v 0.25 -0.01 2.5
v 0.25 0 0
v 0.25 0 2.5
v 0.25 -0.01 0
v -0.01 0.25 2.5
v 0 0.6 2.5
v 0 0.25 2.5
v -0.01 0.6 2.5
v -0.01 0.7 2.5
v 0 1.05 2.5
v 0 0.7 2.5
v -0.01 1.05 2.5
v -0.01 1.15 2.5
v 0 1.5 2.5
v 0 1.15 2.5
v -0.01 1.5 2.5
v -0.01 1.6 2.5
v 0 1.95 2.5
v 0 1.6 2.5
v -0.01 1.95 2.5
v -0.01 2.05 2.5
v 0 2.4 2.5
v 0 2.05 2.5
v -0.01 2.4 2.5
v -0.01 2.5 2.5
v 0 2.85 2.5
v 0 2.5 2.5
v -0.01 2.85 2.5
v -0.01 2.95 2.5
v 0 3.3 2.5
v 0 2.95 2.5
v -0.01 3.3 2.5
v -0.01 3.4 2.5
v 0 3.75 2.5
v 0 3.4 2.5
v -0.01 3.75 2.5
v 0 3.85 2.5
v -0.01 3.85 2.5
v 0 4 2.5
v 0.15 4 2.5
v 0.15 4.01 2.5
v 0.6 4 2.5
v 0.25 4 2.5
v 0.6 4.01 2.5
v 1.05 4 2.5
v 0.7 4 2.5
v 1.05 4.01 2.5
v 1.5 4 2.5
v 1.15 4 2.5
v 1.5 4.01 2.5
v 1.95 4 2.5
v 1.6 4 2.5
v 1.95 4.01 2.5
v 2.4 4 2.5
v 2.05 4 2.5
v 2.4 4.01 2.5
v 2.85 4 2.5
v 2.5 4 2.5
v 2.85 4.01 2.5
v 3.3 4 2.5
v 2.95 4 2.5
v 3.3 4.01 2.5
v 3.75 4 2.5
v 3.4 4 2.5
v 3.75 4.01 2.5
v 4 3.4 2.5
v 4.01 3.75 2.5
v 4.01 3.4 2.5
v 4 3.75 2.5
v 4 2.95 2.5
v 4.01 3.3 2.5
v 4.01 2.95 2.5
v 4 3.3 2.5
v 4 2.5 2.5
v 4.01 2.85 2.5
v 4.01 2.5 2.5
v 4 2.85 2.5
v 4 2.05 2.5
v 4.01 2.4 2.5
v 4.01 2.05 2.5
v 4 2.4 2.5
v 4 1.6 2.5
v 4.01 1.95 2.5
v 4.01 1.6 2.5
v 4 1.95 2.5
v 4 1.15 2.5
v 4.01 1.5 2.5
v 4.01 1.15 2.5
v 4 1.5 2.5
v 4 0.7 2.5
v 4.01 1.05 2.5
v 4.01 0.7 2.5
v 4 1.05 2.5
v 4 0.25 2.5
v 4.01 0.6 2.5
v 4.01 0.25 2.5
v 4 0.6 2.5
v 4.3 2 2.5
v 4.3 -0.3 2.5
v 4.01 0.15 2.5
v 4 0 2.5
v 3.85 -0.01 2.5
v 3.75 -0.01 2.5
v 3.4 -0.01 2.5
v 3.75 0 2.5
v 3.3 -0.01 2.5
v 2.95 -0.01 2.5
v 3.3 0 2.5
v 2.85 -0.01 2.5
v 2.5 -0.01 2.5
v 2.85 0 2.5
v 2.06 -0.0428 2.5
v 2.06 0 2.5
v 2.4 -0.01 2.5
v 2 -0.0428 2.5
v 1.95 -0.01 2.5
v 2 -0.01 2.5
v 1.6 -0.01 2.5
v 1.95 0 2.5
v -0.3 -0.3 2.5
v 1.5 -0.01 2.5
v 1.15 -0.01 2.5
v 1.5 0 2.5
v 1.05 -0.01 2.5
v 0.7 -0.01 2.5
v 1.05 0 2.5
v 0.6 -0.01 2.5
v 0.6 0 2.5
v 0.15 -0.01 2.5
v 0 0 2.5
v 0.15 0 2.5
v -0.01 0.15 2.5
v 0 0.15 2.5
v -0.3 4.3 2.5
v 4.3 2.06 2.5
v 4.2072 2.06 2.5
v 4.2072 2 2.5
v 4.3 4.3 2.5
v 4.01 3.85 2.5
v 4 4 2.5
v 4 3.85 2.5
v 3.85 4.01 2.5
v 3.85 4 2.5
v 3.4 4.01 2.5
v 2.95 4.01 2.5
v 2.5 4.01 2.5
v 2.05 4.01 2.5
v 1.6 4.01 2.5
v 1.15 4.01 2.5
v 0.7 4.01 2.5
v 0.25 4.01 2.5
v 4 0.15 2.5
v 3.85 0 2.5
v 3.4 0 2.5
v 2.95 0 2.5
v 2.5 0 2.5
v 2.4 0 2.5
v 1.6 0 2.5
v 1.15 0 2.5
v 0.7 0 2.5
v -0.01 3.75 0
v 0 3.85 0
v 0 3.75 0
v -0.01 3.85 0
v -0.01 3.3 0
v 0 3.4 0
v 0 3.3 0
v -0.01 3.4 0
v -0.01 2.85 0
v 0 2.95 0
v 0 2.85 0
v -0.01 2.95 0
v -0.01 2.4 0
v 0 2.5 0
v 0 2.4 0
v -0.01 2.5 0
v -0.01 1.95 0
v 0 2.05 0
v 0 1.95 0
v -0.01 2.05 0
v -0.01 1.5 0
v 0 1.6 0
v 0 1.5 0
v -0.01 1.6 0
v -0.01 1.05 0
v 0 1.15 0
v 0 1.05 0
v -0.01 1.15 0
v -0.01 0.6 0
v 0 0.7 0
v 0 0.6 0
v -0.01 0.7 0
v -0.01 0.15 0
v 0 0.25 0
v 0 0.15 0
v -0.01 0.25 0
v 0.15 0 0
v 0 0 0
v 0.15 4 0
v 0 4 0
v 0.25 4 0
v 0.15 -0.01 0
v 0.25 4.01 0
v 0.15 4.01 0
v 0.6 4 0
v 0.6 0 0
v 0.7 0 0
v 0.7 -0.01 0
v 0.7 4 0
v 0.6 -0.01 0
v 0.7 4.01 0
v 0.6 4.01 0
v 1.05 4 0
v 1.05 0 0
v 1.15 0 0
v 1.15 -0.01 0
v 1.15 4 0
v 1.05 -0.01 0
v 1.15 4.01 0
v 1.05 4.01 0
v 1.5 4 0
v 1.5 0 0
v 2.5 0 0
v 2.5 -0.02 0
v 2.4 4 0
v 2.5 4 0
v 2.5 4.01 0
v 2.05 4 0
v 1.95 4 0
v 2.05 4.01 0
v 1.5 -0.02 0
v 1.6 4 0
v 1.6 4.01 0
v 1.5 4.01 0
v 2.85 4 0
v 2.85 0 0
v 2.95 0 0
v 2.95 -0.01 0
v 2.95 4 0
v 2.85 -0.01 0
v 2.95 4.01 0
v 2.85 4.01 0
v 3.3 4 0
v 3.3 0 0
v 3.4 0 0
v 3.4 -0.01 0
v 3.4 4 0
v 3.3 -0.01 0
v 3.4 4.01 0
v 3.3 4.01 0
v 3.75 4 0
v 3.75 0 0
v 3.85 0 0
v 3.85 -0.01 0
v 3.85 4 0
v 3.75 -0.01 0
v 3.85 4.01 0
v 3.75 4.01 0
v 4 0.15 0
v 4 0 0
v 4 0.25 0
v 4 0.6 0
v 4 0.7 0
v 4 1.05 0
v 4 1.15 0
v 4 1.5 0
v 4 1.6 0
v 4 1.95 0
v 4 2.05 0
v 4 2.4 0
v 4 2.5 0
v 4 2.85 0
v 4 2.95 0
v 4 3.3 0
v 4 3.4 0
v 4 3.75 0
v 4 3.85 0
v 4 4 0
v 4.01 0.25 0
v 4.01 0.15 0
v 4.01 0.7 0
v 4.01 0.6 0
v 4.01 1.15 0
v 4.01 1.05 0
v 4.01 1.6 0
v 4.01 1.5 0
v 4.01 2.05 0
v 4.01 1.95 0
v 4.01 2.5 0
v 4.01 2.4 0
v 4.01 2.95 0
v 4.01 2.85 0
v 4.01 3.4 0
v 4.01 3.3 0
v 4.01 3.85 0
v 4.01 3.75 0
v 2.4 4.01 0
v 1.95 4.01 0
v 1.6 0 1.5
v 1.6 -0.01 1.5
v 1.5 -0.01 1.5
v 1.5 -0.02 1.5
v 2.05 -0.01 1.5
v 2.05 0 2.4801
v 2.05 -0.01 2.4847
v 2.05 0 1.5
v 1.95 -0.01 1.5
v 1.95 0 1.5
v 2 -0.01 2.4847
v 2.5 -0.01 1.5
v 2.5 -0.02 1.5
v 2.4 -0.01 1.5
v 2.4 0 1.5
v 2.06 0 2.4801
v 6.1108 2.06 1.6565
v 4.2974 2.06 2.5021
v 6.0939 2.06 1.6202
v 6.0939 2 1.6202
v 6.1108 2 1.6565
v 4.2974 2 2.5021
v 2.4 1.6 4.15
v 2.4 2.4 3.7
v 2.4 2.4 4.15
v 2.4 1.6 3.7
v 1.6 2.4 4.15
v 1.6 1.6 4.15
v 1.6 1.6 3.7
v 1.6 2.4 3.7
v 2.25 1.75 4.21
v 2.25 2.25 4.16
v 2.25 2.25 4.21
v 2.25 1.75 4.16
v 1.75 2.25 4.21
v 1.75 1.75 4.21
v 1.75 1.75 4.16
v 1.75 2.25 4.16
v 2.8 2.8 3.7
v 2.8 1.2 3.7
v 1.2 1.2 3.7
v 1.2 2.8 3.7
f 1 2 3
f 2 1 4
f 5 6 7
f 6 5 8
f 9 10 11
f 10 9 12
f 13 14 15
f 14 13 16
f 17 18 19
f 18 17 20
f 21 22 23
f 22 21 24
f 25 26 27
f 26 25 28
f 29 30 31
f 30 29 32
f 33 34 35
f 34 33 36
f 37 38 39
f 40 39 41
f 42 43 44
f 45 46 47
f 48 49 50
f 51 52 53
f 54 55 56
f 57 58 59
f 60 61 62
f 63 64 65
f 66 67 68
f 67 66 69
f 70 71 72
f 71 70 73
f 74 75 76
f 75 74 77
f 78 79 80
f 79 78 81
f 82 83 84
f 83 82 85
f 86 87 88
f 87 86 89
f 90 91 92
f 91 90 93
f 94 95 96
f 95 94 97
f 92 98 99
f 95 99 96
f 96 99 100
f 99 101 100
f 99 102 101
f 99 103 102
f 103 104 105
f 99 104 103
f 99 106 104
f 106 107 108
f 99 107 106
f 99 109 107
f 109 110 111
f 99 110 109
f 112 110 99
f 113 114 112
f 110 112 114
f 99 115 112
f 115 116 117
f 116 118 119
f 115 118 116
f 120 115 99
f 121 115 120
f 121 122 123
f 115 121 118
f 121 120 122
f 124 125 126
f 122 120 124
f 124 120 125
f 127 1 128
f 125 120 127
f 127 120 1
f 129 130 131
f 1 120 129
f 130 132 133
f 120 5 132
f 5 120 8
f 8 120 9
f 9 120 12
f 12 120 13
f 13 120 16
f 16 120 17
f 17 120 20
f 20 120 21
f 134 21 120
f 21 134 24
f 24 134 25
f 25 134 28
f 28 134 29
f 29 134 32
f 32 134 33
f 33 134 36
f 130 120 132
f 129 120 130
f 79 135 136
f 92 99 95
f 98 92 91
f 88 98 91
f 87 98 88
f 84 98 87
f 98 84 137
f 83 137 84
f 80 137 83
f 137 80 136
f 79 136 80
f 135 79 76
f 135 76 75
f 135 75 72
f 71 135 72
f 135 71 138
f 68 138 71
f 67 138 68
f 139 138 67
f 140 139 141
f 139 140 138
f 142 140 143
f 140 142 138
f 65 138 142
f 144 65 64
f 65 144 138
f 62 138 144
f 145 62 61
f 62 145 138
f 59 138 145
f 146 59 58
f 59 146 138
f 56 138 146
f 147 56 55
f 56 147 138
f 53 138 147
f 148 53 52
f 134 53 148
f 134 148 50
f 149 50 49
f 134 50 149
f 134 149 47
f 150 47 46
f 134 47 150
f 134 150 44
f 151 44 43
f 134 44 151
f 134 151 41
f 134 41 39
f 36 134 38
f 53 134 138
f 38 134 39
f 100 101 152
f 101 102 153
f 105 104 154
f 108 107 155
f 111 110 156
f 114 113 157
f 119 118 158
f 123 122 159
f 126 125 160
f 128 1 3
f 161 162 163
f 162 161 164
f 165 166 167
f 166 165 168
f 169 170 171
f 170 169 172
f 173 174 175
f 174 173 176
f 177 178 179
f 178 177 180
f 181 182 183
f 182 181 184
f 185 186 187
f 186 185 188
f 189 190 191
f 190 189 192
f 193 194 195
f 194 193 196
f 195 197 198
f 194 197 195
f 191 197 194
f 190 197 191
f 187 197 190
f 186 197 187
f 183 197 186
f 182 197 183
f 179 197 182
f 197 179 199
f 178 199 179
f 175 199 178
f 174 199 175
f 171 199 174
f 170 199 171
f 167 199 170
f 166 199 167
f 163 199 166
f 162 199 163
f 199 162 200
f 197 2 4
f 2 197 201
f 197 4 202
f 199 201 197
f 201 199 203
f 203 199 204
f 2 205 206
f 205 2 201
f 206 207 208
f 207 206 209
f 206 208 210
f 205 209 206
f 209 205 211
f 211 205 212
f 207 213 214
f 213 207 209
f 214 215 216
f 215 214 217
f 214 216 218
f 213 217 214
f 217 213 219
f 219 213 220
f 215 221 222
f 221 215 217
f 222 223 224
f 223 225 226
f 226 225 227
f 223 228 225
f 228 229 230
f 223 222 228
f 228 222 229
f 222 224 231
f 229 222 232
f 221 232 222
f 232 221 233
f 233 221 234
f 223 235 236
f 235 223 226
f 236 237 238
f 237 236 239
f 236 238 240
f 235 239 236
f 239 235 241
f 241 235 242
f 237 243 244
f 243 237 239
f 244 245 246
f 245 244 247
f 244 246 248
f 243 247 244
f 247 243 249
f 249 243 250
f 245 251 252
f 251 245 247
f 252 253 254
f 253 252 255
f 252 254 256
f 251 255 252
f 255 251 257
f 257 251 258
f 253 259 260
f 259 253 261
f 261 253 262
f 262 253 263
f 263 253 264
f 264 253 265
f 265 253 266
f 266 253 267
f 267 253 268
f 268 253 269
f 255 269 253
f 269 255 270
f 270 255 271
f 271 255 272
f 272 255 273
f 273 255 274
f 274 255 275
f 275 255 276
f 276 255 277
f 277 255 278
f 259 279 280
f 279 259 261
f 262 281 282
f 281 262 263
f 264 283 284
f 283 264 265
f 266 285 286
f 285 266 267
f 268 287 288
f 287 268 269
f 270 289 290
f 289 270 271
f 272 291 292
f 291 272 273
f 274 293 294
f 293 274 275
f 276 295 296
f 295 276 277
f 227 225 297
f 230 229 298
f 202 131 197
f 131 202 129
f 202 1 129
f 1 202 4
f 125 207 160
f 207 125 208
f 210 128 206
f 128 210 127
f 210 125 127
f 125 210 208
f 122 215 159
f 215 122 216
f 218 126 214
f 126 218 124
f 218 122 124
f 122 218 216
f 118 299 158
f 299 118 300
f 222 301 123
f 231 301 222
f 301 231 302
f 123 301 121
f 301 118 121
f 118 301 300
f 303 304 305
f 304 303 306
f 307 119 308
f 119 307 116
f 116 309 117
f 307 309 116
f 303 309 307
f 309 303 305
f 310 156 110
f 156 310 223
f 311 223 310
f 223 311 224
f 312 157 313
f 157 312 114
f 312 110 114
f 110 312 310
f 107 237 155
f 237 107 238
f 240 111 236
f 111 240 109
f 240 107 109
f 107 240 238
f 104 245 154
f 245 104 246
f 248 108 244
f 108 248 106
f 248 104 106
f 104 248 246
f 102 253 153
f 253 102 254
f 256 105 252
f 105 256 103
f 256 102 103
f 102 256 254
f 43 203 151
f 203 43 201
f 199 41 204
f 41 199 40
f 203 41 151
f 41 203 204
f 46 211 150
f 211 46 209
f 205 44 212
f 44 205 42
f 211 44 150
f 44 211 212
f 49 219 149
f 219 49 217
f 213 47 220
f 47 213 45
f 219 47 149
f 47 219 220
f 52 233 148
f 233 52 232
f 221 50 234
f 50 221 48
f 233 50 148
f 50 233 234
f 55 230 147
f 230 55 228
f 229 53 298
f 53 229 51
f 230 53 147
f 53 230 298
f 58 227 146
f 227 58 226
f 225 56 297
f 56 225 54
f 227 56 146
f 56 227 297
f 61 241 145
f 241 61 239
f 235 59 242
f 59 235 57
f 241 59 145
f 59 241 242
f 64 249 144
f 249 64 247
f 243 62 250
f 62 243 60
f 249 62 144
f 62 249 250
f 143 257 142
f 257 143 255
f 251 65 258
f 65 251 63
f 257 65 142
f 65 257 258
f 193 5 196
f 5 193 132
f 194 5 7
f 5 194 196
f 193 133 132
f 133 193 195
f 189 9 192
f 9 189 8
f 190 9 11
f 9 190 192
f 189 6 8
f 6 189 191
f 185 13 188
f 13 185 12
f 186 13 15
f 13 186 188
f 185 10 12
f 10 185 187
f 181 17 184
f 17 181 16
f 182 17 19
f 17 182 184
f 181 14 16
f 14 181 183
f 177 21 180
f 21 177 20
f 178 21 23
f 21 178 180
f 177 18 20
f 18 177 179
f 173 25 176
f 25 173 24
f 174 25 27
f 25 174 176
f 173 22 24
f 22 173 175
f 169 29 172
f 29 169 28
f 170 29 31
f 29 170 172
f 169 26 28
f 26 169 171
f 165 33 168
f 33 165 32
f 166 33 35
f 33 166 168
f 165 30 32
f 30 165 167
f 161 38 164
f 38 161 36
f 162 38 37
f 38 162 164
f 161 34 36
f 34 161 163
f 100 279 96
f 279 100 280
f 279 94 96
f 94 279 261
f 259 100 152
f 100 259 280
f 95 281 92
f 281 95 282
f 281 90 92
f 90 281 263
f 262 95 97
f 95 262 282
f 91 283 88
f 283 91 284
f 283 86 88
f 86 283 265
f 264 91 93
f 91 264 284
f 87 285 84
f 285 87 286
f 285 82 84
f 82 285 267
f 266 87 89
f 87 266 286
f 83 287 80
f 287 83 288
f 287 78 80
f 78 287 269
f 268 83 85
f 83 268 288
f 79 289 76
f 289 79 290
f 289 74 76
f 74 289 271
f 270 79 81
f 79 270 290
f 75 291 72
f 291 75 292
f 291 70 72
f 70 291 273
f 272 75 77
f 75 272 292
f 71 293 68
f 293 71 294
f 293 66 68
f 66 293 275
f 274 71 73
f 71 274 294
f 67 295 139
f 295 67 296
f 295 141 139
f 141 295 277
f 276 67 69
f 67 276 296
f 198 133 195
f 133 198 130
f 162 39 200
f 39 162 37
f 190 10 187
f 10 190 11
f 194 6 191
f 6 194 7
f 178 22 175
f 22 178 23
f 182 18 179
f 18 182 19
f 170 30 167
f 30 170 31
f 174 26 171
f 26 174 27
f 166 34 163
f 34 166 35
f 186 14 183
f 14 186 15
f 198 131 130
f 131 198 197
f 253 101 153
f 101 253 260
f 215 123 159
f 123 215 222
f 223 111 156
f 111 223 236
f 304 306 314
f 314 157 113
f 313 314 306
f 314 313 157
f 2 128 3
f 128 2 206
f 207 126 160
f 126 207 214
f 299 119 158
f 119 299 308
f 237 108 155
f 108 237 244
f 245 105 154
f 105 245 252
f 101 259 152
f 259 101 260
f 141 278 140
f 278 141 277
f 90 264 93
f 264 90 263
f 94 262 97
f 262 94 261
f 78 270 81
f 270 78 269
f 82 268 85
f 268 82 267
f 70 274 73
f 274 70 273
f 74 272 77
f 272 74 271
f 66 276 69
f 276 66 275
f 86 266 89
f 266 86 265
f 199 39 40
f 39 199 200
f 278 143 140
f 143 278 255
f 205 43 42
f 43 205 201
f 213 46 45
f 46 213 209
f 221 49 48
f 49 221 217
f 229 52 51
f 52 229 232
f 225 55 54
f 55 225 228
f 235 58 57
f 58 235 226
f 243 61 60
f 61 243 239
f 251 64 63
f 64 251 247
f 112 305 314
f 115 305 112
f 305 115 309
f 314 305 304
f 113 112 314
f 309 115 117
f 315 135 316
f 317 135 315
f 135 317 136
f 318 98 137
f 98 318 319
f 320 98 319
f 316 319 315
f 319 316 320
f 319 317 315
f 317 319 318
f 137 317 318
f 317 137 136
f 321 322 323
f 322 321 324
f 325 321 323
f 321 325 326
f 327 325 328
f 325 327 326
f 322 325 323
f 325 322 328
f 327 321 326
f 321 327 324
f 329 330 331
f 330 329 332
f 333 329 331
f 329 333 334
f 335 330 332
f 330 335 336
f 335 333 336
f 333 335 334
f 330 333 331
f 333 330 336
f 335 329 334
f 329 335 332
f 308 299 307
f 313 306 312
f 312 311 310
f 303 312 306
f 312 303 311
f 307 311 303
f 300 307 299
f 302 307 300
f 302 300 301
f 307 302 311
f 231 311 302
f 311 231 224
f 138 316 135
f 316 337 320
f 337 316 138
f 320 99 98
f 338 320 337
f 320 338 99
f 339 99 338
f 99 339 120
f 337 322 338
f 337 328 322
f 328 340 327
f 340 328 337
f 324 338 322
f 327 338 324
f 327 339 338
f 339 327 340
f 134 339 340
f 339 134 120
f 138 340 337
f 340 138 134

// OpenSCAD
// ============================================================
// CLASH OF CLANS - TOWN HALL LEVEL 1
// ============================================================
//
// Approximation based on Town_Hall1.png
//
// Footprint : 4 x 4
// Type      : Town Hall
// Level     : 1
// ============================================================


// ============================================================
// CONFIGURATION
// ============================================================

$fn = 32;

TH_WIDTH  = 4;
TH_DEPTH  = 4;

WALL_HEIGHT = 2.5;
ROOF_HEIGHT = 1.2;


// ============================================================
// COLORS
// ============================================================

WOOD_DARK   = "#4A2E1B";
WOOD        = "#65401F";
WOOD_LIGHT  = "#79502A";

ROOF        = "#F59A24";
ROOF_LIGHT  = "#FFB52E";
ROOF_DARK   = "#D87818";

STONE       = "#77706A";
STONE_DARK  = "#4F4B47";

DOOR        = "#2E1B12";


// ============================================================
// WOOD WALL
// ============================================================

module wood_wall(
    width = TH_WIDTH,
    depth = TH_DEPTH,
    height = WALL_HEIGHT
) {

    color(WOOD)
        cube([
            width,
            depth,
            height
        ]);
}


// ============================================================
// WOOD PLANKS
// ============================================================
//
// Vertical wooden planks around the building.
// ============================================================

module wood_planks(
    width = TH_WIDTH,
    depth = TH_DEPTH,
    height = WALL_HEIGHT
) {

    // ------------------------------------------
    // Front wall
    // ------------------------------------------

    for (x = [0.15 : 0.45 : width - 0.15]) {

        color(WOOD_DARK)
            translate([
                x,
                -0.01,
                0
            ])
                cube([
                    0.10,
                    0.05,
                    height
                ]);
    }


    // ------------------------------------------
    // Back wall
    // ------------------------------------------

    for (x = [0.15 : 0.45 : width - 0.15]) {

        color(WOOD_DARK)
            translate([
                x,
                depth - 0.04,
                0
            ])
                cube([
                    0.10,
                    0.05,
                    height
                ]);
    }


    // ------------------------------------------
    // Left wall
    // ------------------------------------------

    for (y = [0.15 : 0.45 : depth - 0.15]) {

        color(WOOD_DARK)
            translate([
                -0.01,
                y,
                0
            ])
                cube([
                    0.05,
                    0.10,
                    height
                ]);
    }


    // ------------------------------------------
    // Right wall
    // ------------------------------------------

    for (y = [0.15 : 0.45 : depth - 0.15]) {

        color(WOOD_DARK)
            translate([
                width - 0.04,
                y,
                0
            ])
                cube([
                    0.05,
                    0.10,
                    height
                ]);
    }
}


// ============================================================
// CORNER POSTS
// ============================================================

module corner_posts(
    width = TH_WIDTH,
    depth = TH_DEPTH,
    height = WALL_HEIGHT
) {

    positions = [
        [0, 0],
        [width - 0.25, 0],
        [0, depth - 0.25],
        [width - 0.25, depth - 0.25]
    ];

    for (p = positions) {

        color(WOOD_LIGHT)

            translate([
                p[0],
                p[1],
                0
            ])

                cube([
                    0.25,
                    0.25,
                    height
                ]);
    }
}


// ============================================================
// DOOR
// ============================================================

module door(
    width = 1,
    height = 1.5
) {

    color(DOOR)

        translate([
            (TH_WIDTH - width) / 2,
            -0.02,
            0
        ])

            cube([
                width,
                0.08,
                height
            ]);
}


// ============================================================
// ROOF
// ============================================================
//
// Hipped roof approximation.
//
// Bottom:
//      4.6 x 4.6
//
// Top:
//      1.6 x 1.6
//
// ============================================================

module roof(
    width = TH_WIDTH,
    depth = TH_DEPTH
) {

    roof_width = width + 0.6;
    roof_depth = depth + 0.6;

    top_width = 1.6;
    top_depth = 1.6;

    bottom_z = WALL_HEIGHT;
    top_z = WALL_HEIGHT + ROOF_HEIGHT;


    color(ROOF)

        polyhedron(

            points = [

                // --------------------------------------
                // Bottom
                // --------------------------------------

                [
                    -0.3,
                    -0.3,
                    bottom_z
                ],

                [
                    roof_width - 0.3,
                    -0.3,
                    bottom_z
                ],

                [
                    roof_width - 0.3,
                    roof_depth - 0.3,
                    bottom_z
                ],

                [
                    -0.3,
                    roof_depth - 0.3,
                    bottom_z
                ],


                // --------------------------------------
                // Top
                // --------------------------------------

                [
                    (roof_width - top_width) / 2 - 0.3,
                    (roof_depth - top_depth) / 2 - 0.3,
                    top_z
                ],

                [
                    (roof_width + top_width) / 2 - 0.3,
                    (roof_depth - top_depth) / 2 - 0.3,
                    top_z
                ],

                [
                    (roof_width + top_width) / 2 - 0.3,
                    (roof_depth + top_depth) / 2 - 0.3,
                    top_z
                ],

                [
                    (roof_width - top_width) / 2 - 0.3,
                    (roof_depth + top_depth) / 2 - 0.3,
                    top_z
                ]
            ],

            faces = [

                // Bottom
                [0, 1, 2, 3],

                // Front
                [0, 4, 5, 1],

                // Right
                [1, 5, 6, 2],

                // Back
                [2, 6, 7, 3],

                // Left
                [3, 7, 4, 0],

                // Top
                [4, 7, 6, 5]
            ]
        );
}


// ============================================================
// ROOF PANELS
// ============================================================
//
// Decorative roof seams.
// ============================================================

module roof_seams() {

    // Front roof seam
    color(ROOF_DARK)
        translate([
            TH_WIDTH / 2,
            -0.15,
            WALL_HEIGHT + 0.05
        ])
            rotate([
                -25,
                0,
                0
            ])
                cube([
                    0.06,
                    2.2,
                    0.04
                ]);


    // Right roof seam
    color(ROOF_DARK)
        translate([
            TH_WIDTH + 0.1,
            TH_DEPTH / 2,
            WALL_HEIGHT + 0.05
        ])
            rotate([
                0,
                25,
                0
            ])
                cube([
                    2.2,
                    0.06,
                    0.04
                ]);
}


// ============================================================
// CHIMNEY
// ============================================================

module chimney() {

    chimney_width = 0.8;
    chimney_height = 0.6;


    // Chimney body

    color(STONE)

        translate([
            TH_WIDTH / 2 - chimney_width / 2,
            TH_DEPTH / 2 - chimney_width / 2,
            WALL_HEIGHT + ROOF_HEIGHT - 0.15
        ])

            cube([
                chimney_width,
                chimney_width,
                chimney_height
            ]);


    // Dark chimney opening

    color(STONE_DARK)

        translate([
            TH_WIDTH / 2 - 0.25,
            TH_DEPTH / 2 - 0.25,
            WALL_HEIGHT + ROOF_HEIGHT + chimney_height - 0.14
        ])

            cube([
                0.5,
                0.5,
                0.05
            ]);
}


// ============================================================
// TOWN HALL LEVEL 1
// ============================================================

module townhall_level_1() {

    // ------------------------------------------
    // Main wooden building
    // ------------------------------------------

    wood_wall();


    // ------------------------------------------
    // Wooden details
    // ------------------------------------------

    wood_planks();

    corner_posts();


    // ------------------------------------------
    // Door
    // ------------------------------------------

    door();


    // ------------------------------------------
    // Roof
    // ------------------------------------------

    roof();

    roof_seams();


    // ------------------------------------------
    // Chimney
    // ------------------------------------------

    chimney();
}


// ============================================================
// RENDER
// ============================================================
translate([0,0,0])
    townhall_level_1();
    // cube([1,2,3]);
